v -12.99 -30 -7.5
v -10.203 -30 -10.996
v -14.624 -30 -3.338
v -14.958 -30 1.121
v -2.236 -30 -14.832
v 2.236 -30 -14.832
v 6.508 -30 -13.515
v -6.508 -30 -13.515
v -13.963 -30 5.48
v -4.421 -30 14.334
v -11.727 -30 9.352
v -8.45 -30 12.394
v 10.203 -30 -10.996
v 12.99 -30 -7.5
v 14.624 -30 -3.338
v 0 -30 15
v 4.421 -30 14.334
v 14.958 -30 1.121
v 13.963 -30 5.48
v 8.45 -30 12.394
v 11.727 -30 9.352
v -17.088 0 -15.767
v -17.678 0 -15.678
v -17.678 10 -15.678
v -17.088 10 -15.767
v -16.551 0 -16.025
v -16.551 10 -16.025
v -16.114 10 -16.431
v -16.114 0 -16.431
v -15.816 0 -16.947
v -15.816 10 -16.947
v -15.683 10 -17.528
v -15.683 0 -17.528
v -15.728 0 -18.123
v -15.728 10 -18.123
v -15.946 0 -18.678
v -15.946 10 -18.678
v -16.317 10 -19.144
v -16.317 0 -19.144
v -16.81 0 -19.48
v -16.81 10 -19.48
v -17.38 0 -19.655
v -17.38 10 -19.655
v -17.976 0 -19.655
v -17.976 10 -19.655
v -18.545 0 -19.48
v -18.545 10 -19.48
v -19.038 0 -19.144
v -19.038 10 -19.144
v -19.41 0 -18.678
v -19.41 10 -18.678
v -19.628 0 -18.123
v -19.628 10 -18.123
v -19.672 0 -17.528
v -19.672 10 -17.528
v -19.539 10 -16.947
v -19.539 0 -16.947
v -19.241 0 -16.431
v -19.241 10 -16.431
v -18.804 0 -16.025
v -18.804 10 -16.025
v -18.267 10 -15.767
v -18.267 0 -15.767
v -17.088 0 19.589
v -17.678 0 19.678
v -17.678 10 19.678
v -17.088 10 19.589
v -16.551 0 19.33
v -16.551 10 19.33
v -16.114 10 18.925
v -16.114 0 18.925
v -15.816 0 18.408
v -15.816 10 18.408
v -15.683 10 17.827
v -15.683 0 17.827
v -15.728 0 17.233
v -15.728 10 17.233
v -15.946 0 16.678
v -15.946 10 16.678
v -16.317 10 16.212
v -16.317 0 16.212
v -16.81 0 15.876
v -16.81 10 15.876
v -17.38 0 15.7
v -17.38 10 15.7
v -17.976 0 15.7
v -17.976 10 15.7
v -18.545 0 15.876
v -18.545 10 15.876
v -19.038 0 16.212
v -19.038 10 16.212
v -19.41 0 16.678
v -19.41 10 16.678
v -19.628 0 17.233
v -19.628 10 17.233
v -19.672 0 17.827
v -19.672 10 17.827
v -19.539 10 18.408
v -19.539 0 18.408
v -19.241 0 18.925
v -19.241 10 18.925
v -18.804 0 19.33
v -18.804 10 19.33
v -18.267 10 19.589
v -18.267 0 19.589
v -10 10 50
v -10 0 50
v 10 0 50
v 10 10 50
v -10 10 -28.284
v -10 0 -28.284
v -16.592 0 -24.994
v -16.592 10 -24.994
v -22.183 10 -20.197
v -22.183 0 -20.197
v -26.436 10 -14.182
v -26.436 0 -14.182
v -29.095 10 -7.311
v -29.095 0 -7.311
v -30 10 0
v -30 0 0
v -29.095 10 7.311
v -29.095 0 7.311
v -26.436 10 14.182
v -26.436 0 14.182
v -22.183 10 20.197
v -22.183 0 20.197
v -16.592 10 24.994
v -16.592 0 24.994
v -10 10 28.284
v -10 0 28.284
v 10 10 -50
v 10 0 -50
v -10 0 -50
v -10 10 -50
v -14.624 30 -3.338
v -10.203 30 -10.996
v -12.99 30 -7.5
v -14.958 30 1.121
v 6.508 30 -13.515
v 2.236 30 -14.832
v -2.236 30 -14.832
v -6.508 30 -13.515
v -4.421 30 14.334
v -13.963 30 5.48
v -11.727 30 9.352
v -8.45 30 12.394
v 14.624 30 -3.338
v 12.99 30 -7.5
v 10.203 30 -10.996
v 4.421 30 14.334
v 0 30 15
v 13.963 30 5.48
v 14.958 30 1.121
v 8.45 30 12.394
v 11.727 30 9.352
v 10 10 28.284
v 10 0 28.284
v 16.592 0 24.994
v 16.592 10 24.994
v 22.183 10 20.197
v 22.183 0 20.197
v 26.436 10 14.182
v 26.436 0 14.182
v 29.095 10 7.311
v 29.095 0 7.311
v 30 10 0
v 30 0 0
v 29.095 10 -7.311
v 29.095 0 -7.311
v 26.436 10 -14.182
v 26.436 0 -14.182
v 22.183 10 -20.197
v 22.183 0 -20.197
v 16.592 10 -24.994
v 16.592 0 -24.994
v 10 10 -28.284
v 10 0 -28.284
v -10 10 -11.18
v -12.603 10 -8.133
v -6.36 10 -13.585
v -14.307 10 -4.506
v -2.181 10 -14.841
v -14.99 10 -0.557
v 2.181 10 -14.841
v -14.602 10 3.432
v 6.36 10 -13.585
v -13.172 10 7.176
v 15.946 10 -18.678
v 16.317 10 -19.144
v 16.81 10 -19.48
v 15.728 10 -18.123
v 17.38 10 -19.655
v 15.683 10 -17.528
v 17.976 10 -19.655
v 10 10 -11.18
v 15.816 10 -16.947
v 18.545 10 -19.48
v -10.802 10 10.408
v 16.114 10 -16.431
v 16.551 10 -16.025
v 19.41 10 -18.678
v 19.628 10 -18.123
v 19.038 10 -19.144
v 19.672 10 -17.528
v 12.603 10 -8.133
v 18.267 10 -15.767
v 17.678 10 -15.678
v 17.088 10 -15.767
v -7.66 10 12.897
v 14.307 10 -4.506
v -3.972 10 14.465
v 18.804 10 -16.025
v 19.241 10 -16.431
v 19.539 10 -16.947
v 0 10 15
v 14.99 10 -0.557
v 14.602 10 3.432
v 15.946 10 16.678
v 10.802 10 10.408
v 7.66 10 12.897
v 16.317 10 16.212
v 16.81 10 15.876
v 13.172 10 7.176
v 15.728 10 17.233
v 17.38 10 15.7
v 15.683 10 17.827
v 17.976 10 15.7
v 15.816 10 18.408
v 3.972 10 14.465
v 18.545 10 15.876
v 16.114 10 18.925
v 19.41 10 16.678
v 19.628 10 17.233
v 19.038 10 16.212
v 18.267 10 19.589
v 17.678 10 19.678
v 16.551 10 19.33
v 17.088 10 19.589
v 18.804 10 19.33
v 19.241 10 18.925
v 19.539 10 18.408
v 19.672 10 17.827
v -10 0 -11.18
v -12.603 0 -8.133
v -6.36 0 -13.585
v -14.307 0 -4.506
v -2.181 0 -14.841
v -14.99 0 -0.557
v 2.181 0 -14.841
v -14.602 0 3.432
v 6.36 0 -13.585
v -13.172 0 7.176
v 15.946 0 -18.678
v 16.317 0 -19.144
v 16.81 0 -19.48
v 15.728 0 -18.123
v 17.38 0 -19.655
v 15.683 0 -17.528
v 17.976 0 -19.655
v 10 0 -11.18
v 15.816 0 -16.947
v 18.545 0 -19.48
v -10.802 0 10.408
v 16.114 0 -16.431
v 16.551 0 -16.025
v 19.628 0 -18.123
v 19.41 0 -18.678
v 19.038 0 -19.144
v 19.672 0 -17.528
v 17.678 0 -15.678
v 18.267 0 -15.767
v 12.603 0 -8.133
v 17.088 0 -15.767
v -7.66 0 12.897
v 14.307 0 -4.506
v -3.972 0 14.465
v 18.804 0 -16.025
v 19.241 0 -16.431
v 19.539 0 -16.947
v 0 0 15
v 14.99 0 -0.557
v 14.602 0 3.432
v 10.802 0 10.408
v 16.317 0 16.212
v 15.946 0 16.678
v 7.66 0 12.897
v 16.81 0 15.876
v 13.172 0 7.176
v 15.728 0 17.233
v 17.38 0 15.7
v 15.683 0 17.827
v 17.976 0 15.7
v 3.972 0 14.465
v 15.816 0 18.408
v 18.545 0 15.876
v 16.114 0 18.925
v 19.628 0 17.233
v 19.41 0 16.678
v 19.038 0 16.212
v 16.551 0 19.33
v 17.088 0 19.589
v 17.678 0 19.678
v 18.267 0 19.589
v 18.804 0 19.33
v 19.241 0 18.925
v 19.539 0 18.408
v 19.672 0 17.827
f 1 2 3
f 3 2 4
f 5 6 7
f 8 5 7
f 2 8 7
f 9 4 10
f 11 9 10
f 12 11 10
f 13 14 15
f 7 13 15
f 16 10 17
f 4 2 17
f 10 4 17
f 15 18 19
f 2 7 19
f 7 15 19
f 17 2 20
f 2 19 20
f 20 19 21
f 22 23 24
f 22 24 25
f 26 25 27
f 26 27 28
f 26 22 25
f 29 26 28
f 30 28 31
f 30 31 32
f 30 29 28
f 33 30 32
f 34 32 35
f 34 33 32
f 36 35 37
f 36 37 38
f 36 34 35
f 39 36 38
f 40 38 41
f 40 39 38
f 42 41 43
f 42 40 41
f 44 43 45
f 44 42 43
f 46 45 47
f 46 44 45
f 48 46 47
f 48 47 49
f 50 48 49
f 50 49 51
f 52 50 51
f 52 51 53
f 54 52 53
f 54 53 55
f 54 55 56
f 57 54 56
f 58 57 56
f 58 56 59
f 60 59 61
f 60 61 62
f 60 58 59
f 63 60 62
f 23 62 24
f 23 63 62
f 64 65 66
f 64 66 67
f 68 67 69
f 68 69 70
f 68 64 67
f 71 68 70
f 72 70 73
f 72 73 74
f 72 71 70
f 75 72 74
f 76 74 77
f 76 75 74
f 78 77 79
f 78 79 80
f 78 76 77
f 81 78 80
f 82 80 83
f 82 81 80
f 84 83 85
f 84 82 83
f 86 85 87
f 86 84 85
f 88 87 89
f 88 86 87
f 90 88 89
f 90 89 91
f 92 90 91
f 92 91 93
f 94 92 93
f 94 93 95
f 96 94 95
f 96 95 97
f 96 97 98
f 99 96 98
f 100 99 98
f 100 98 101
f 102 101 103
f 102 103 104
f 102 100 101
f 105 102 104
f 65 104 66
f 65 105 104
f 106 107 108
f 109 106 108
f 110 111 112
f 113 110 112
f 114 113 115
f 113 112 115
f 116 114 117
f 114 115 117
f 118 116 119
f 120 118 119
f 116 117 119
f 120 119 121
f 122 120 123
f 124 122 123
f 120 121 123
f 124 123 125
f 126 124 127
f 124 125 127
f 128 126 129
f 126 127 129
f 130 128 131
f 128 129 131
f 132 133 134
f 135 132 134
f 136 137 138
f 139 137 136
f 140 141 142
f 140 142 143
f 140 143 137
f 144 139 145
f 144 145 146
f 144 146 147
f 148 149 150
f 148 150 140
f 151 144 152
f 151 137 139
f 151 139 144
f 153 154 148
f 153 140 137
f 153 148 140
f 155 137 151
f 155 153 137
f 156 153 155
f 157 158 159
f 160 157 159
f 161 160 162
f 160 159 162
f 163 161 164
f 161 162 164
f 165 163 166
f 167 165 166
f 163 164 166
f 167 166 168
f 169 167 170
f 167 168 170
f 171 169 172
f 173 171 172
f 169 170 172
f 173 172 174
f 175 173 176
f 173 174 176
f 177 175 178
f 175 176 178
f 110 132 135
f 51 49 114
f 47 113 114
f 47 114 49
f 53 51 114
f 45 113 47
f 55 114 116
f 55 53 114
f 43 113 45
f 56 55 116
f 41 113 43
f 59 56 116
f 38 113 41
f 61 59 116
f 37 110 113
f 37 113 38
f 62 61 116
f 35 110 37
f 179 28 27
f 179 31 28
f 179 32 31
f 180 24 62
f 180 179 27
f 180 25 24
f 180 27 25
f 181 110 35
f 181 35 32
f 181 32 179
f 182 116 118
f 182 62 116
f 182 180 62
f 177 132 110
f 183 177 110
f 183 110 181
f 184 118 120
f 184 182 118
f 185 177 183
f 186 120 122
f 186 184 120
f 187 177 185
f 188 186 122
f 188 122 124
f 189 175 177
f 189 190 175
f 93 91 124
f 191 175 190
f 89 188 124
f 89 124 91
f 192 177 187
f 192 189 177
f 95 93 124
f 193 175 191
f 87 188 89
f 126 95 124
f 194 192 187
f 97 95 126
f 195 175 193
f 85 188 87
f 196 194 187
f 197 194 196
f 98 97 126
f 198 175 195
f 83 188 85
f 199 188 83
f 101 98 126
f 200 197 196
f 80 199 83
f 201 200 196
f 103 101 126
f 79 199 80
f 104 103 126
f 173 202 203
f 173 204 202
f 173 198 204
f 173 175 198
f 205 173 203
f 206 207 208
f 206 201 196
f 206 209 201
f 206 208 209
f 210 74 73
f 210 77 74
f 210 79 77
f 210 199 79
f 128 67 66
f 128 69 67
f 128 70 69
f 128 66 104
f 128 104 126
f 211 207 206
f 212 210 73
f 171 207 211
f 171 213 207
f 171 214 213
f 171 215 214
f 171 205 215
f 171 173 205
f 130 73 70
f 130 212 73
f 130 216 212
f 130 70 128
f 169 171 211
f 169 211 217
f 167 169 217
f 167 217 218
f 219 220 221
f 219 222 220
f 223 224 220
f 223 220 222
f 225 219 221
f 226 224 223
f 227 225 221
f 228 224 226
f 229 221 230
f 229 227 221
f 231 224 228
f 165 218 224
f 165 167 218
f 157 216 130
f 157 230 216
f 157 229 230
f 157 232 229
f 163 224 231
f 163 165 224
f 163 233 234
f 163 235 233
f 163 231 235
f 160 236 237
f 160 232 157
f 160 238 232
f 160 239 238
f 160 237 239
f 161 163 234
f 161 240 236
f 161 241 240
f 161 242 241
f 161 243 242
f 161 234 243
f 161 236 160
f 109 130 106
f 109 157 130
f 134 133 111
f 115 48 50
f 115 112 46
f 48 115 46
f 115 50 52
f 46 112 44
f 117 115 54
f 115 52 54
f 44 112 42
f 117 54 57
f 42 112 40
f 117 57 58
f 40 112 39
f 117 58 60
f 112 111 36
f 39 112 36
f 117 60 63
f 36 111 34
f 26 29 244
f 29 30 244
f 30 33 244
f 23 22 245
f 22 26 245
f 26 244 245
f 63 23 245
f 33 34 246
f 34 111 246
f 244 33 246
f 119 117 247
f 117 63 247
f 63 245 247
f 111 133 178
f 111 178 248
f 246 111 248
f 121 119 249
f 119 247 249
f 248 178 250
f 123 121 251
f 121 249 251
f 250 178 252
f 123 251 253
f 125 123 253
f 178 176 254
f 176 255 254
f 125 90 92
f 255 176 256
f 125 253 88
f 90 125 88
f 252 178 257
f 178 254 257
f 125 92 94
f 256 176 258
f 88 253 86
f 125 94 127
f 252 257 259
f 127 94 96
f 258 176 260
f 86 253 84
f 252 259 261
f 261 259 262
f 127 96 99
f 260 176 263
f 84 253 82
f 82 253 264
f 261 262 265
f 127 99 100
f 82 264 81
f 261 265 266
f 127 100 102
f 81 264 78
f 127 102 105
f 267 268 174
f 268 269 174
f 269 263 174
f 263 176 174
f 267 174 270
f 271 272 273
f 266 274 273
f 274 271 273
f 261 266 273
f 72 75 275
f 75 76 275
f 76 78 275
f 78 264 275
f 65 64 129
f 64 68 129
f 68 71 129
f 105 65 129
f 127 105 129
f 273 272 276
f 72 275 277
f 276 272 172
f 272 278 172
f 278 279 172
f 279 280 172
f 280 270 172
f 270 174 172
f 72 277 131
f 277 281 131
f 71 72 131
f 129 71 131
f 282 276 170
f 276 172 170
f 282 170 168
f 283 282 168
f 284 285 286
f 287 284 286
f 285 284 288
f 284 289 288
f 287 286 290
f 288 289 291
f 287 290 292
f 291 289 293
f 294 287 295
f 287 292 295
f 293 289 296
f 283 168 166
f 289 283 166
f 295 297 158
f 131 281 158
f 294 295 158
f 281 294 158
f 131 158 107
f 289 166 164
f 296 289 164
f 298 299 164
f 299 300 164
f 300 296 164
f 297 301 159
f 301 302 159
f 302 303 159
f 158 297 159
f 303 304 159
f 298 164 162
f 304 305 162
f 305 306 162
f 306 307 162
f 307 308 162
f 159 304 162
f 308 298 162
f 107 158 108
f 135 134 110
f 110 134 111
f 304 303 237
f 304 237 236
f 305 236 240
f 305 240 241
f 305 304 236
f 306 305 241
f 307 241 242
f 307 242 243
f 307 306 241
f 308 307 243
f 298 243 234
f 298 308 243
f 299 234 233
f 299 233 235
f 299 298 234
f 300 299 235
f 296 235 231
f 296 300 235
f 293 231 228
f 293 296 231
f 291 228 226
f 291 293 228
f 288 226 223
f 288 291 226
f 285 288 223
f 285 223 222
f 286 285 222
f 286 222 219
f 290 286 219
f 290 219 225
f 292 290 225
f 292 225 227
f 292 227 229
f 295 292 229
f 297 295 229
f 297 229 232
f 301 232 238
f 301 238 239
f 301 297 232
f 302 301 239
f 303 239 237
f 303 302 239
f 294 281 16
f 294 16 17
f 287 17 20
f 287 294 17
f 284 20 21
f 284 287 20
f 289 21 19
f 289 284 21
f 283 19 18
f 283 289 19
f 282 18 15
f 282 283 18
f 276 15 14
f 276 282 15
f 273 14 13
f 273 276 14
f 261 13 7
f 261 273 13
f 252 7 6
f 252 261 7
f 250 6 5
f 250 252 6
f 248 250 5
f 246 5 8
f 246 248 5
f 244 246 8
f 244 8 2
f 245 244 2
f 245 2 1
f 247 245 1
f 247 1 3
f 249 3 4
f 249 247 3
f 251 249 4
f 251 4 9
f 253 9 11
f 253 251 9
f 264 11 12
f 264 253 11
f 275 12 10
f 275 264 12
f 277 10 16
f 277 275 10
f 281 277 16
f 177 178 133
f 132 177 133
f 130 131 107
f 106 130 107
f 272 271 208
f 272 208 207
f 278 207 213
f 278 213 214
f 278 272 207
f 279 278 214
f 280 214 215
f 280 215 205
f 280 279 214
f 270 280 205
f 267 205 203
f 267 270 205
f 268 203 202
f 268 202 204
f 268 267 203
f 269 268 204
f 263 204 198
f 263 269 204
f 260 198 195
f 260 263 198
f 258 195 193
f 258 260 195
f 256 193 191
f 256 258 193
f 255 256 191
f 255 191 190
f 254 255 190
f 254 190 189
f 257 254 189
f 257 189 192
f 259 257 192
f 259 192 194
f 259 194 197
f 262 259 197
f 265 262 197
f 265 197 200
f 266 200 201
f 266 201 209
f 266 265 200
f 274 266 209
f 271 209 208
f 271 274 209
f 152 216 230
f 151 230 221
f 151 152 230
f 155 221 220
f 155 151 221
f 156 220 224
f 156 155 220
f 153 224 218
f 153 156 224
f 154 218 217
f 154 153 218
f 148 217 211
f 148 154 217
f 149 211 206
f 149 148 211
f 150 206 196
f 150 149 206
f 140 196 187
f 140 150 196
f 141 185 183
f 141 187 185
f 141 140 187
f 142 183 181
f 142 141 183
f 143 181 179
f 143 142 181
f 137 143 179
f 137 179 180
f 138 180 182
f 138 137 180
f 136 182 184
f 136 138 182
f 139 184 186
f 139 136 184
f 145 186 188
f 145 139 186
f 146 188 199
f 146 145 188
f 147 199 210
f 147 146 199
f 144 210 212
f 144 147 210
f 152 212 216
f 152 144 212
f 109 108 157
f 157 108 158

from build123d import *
from build123d.topology import SkipClean

# Parameters (mm, degrees)
SKETCH1_R           = 30
SKETCH1_R_2         = 15
SKETCH1_R_3         = 2
BOSS_EXTRUDE1_DEPTH = 10
BOSS_EXTRUDE2_START = -10
BOSS_EXTRUDE2_DEPTH = 10
SKETCH5_R           = 15
BOSS_EXTRUDE3_DEPTH = 30


with BuildPart() as part:
    # Sketch1 → Boss-Extrude1 (new body)
    with BuildSketch(Plane(origin=(0, 0, 0), x_dir=(1, 0, 0), z_dir=(0, 1, 0))):
        with Locations(Location((0, 0, 0), (0, 0, 270))):
            Circle(SKETCH1_R)
        with Locations(Location((0, 0, 0), (0, 0, 270))):
            Circle(SKETCH1_R_2, mode=Mode.SUBTRACT)
        with Locations(Location((-17.67766953, 17.67766953, 0), (0, 0, 270))):
            Circle(SKETCH1_R_3, mode=Mode.SUBTRACT)
        with Locations(Location((17.67766953, 17.67766953, 0), (0, 0, 270))):
            Circle(SKETCH1_R_3, mode=Mode.SUBTRACT)
        with Locations(Location((17.67766953, -17.67766953, 0), (0, 0, 270))):
            Circle(SKETCH1_R_3, mode=Mode.SUBTRACT)
        with Locations(Location((-17.67766953, -17.67766953, 0), (0, 0, 270))):
            Circle(SKETCH1_R_3, mode=Mode.SUBTRACT)
    extrude(amount=BOSS_EXTRUDE1_DEPTH)

    # Sketch2 → Boss-Extrude2 (add)
    with SkipClean():  # the faces are left unmerged after this step: merging them gives an invalid solid
        with BuildSketch(Plane(origin=(0, 10, 0), x_dir=(1, 0, 0), z_dir=(0, 1, 0)).offset(BOSS_EXTRUDE2_START)):
            with BuildLine():
                ThreePointArc((-10, 11.180339887), (0, 15), (10, 11.180339887))
                Line((10, 11.180339887), (10, 28.284271247))
                ThreePointArc((10, 28.284271247), (0, 30), (-10, 28.284271247))
                Line((-10, 28.284271247), (-10, 11.180339887))
            make_face()
            with BuildLine():
                ThreePointArc((-10, 28.284271247), (0, 30), (10, 28.284271247))
                Line((10, 28.284271247), (10, 50))
                Line((10, 50), (-10, 50))
                Line((-10, 50), (-10, 28.284271247))
            make_face()
            with BuildLine():
                ThreePointArc((10, -11.180339887), (0, -15), (-10, -11.180339887))
                Line((-10, -11.180339887), (-10, -28.284271247))
                ThreePointArc((-10, -28.284271247), (0, -30), (10, -28.284271247))
                Line((10, -28.284271247), (10, -11.180339887))
            make_face()
            with BuildLine():
                Line((10, -50), (10, -28.284271247))
                ThreePointArc((10, -28.284271247), (0, -30), (-10, -28.284271247))
                Line((-10, -28.284271247), (-10, -50))
                Line((-10, -50), (10, -50))
            make_face()
        extrude(amount=BOSS_EXTRUDE2_DEPTH)

    # Sketch5 → Boss-Extrude3 (add, symmetric)
    with BuildSketch(Plane(origin=(0, 0, 0), x_dir=(1, 0, 0), z_dir=(0, 1, 0))):
        with Locations(Location((0, 0, 0), (0, 0, 270))):
            Circle(SKETCH5_R)
    extrude(amount=BOSS_EXTRUDE3_DEPTH, both=True)


solid = part.part
